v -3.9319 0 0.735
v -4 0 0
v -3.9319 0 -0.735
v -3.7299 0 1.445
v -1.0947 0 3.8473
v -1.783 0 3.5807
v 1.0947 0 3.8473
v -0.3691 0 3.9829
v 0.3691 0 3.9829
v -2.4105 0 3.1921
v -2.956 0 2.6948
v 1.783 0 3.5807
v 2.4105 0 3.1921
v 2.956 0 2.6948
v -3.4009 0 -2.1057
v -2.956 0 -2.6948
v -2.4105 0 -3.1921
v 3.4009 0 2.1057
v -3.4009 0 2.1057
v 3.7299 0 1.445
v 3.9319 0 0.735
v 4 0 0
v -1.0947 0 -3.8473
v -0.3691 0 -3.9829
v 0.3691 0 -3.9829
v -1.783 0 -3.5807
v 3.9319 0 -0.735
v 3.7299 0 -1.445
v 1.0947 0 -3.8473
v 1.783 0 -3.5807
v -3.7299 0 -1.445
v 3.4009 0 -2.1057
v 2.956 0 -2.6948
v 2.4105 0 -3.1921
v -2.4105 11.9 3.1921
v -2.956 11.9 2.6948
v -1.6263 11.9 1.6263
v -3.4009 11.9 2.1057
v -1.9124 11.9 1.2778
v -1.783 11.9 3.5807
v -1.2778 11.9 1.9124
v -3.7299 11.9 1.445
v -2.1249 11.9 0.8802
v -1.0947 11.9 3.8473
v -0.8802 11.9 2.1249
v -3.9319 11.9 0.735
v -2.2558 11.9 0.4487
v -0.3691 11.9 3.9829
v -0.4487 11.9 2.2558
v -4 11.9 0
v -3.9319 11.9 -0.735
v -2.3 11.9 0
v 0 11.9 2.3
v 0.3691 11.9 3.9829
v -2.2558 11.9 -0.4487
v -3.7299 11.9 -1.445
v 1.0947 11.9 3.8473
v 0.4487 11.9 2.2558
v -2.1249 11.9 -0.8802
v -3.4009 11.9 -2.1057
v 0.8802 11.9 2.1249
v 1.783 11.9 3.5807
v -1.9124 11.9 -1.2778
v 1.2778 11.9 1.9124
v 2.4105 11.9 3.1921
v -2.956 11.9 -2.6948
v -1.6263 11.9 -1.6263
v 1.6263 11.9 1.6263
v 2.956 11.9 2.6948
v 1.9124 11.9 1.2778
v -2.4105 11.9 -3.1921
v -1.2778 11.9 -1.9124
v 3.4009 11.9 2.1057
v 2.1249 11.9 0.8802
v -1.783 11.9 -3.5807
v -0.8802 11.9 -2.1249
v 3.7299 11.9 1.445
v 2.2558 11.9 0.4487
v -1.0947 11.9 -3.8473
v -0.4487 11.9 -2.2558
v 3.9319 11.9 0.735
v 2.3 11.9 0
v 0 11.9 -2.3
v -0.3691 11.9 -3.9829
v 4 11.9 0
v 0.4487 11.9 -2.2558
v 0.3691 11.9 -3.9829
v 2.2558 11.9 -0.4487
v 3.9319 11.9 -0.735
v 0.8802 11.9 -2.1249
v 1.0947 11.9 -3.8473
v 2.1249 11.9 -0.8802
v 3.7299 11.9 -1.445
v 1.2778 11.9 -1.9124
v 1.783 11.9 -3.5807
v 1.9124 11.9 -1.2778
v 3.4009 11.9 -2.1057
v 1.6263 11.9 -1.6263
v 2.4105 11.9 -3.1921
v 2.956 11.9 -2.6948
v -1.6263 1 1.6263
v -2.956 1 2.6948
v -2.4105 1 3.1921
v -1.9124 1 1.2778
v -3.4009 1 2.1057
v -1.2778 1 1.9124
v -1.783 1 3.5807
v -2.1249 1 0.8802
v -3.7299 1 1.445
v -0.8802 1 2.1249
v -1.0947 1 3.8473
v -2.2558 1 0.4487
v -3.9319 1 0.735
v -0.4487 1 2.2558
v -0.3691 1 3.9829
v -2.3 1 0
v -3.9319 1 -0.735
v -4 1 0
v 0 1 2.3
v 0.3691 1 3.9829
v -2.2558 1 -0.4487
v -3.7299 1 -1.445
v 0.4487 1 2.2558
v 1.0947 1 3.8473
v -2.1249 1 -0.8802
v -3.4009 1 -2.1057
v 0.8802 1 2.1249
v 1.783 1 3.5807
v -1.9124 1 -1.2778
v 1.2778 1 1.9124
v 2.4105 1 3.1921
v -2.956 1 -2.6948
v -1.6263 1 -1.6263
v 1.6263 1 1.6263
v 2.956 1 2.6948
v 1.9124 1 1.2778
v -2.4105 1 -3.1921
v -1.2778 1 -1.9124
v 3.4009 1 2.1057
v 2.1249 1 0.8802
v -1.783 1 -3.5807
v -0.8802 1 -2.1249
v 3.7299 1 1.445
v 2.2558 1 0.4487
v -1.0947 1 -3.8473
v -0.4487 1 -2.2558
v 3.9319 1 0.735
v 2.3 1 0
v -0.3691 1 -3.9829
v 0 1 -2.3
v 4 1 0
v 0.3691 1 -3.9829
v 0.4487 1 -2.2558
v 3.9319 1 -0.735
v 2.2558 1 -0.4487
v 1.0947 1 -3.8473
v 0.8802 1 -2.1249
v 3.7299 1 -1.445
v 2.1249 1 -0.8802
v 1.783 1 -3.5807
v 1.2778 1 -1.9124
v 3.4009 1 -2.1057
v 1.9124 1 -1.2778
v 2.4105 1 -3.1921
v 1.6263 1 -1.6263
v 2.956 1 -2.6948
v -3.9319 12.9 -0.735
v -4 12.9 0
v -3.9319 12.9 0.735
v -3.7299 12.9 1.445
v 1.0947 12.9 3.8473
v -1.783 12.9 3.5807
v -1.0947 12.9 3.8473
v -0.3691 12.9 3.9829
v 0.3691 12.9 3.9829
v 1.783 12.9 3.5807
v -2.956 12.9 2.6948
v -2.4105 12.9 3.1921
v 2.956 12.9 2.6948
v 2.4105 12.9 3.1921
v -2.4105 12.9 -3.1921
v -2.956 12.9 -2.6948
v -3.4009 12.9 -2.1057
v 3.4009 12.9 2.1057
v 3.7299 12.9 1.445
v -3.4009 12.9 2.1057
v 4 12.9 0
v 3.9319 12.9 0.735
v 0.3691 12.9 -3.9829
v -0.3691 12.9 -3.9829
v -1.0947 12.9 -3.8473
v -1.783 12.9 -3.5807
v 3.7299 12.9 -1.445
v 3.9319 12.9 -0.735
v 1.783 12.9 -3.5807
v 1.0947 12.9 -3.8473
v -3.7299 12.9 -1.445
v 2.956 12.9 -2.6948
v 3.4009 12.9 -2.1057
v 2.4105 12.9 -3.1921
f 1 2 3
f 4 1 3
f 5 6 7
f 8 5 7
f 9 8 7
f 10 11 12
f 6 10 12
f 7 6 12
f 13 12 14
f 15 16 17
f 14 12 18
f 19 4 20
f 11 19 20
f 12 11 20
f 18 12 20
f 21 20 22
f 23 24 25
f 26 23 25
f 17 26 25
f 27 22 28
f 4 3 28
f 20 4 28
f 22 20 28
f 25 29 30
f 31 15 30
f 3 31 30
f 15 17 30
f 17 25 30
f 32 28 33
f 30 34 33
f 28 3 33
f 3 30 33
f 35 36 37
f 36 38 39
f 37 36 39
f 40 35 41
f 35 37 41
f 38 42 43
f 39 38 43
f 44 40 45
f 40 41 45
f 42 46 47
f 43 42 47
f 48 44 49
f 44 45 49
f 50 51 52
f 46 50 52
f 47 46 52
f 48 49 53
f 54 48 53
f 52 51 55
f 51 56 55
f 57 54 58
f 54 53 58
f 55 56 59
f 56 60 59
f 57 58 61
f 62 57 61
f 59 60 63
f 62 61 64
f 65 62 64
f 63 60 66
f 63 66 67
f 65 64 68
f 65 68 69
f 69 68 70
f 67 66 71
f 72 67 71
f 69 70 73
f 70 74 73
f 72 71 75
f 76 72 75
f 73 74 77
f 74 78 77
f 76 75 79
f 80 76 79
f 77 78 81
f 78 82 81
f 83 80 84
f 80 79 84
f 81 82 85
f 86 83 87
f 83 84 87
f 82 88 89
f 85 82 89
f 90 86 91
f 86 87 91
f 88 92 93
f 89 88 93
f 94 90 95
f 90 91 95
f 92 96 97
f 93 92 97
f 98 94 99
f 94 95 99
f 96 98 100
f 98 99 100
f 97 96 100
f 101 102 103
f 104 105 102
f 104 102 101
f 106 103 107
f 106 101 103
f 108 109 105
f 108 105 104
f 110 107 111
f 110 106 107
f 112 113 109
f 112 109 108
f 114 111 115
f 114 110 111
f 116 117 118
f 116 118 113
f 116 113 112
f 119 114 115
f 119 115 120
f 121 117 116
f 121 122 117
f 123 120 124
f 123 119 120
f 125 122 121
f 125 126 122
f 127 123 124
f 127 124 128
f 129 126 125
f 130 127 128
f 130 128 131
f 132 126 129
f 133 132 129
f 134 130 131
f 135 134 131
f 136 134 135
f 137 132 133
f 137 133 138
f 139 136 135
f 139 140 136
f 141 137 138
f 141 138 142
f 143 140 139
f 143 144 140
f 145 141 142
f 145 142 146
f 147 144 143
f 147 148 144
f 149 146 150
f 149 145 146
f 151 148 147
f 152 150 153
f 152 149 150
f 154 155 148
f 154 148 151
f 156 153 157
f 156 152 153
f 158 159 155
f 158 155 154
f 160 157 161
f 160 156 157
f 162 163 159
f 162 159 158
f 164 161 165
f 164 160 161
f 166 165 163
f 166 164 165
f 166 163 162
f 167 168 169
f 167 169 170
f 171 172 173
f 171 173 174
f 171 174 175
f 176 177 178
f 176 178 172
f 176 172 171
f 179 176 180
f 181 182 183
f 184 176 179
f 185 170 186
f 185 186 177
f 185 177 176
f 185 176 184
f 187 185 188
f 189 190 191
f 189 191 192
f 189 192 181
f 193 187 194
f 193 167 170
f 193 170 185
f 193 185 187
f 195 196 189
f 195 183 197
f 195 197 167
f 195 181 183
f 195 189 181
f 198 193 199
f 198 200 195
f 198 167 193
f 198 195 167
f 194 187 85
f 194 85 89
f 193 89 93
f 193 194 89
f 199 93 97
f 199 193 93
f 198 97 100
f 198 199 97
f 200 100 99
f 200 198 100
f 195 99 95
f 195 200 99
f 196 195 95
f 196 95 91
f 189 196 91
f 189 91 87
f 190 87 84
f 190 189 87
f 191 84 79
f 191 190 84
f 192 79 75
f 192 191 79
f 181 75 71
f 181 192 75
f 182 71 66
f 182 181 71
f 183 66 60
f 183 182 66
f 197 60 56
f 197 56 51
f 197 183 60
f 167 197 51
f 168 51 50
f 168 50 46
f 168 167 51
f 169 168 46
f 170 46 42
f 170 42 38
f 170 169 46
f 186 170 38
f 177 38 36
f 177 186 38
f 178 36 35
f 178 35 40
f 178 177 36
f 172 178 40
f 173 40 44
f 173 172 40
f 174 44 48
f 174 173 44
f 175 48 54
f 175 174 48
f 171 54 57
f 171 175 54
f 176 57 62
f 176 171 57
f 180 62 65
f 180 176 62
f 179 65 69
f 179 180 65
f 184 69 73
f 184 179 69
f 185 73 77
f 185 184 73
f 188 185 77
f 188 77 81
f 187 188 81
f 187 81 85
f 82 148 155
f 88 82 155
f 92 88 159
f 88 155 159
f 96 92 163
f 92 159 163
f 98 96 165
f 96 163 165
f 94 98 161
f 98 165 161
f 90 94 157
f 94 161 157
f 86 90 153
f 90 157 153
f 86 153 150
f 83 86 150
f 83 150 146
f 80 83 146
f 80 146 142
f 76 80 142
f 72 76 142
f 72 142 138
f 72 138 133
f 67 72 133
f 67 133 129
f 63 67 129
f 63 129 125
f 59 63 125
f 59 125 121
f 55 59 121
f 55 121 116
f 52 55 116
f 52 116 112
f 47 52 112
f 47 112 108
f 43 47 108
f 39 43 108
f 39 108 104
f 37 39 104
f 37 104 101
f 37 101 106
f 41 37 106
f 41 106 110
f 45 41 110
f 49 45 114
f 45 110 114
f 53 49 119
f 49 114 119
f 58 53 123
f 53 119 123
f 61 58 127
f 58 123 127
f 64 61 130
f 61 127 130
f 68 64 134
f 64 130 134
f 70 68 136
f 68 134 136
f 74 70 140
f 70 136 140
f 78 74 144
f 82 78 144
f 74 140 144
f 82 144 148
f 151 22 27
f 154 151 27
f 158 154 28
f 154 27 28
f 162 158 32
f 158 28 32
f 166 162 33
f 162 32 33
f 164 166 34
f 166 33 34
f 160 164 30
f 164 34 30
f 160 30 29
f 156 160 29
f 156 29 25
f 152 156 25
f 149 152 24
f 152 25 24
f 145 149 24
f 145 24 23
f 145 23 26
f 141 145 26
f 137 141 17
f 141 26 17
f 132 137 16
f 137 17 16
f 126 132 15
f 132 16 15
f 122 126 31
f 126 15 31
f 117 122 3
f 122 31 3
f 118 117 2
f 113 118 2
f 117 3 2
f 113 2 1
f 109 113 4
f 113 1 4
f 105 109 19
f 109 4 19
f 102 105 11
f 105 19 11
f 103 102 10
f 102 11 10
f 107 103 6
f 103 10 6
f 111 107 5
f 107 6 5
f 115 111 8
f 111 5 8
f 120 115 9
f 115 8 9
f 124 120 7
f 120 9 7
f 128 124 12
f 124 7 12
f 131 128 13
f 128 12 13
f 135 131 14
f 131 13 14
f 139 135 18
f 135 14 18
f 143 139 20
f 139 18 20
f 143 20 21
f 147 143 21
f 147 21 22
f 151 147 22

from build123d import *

# Parameters (mm, degrees)
SKETCH1_R           = 2.3
BOSS_EXTRUDE1_DEPTH = 12.9
BOSS_EXTRUDE2_START = 6.45
SKETCH2_R           = 4
SKETCH2_R_2         = 2.3
BOSS_EXTRUDE2_DEPTH = 1
BOSS_EXTRUDE3_START = -6.45
SKETCH2_3_R         = 4
SKETCH2_3_R_2       = 2.3
BOSS_EXTRUDE3_DEPTH = 1


with BuildPart() as part:
    # Sketch1 → Boss-Extrude1 (new body)
    with BuildSketch(Plane(origin=(0, 0, 0), x_dir=(1, 0, 0), z_dir=(0, 1, 0))):
        Circle(SKETCH1_R)
    extrude(amount=BOSS_EXTRUDE1_DEPTH)

    # Sketch2 → Boss-Extrude2 (add)
    with BuildSketch(Plane(origin=(0, 6.45, 0), x_dir=(1, 0, 0), z_dir=(0, 1, 0)).offset(BOSS_EXTRUDE2_START)):
        Circle(SKETCH2_R)
        Circle(SKETCH2_R_2, mode=Mode.SUBTRACT)
    extrude(amount=-BOSS_EXTRUDE2_DEPTH)

    # Sketch2<3> → Boss-Extrude3 (add)
    with BuildSketch(Plane(origin=(0, 6.45, 0), x_dir=(1, 0, 0), z_dir=(0, 1, 0)).offset(BOSS_EXTRUDE3_START)):
        Circle(SKETCH2_3_R)
        Circle(SKETCH2_3_R_2, mode=Mode.SUBTRACT)
    extrude(amount=BOSS_EXTRUDE3_DEPTH)


solid = part.part
